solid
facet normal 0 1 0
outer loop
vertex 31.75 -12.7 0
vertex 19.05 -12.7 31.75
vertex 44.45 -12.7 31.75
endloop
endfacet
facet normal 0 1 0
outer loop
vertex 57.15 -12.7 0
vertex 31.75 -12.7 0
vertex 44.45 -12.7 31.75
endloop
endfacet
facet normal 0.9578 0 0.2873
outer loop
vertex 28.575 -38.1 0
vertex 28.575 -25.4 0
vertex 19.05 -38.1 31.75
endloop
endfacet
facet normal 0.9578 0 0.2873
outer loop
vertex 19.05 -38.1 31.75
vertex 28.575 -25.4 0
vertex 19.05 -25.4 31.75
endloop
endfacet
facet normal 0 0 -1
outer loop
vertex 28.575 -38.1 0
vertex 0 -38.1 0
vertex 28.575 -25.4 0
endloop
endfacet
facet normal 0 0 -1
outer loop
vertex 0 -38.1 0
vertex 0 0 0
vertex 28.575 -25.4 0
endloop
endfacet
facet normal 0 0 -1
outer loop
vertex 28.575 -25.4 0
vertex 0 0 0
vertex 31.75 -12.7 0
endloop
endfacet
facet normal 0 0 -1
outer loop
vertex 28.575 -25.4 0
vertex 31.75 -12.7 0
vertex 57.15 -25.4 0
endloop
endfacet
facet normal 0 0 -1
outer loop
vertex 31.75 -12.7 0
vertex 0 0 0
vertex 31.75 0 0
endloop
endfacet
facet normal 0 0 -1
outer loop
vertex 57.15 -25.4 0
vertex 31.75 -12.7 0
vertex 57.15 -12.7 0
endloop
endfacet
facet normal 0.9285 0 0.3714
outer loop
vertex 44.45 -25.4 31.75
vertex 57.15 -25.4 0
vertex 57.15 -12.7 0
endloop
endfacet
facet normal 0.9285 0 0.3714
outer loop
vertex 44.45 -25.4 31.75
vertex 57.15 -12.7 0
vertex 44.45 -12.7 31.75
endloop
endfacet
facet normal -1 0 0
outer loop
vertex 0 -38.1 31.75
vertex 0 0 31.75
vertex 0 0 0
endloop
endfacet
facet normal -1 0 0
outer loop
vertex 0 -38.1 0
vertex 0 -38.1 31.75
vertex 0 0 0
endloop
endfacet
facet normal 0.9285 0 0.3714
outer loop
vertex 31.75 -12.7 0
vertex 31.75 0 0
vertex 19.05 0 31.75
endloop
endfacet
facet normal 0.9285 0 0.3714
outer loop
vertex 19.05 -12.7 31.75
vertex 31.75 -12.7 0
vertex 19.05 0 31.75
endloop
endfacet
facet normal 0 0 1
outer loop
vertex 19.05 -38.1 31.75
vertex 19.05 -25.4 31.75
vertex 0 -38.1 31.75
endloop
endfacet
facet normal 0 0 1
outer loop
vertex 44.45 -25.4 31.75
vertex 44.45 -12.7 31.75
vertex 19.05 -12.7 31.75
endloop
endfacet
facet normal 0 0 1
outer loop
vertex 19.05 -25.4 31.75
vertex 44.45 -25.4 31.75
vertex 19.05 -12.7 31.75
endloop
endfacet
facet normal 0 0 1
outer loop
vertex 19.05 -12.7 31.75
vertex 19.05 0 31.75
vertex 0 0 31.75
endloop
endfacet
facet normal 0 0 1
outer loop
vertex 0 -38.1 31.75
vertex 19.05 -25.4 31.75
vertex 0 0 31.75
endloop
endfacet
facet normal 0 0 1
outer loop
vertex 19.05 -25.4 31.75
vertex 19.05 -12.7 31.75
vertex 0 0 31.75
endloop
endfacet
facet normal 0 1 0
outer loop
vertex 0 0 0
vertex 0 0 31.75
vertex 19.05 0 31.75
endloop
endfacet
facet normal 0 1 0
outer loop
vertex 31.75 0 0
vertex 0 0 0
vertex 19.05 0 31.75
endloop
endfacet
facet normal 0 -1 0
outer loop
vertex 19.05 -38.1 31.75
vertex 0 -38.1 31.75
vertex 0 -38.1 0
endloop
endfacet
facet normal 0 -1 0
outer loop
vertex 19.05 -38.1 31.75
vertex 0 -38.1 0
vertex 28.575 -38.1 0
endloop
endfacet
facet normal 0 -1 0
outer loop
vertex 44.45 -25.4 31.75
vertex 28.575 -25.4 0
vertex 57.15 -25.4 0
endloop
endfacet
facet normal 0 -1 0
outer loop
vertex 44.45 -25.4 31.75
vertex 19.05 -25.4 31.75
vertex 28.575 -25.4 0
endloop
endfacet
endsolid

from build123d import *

# Parameters (mm, degrees)
F1_DEPTH = 25.4
F3_DEPTH = 12.7
F5_DEPTH = 12.7


with BuildPart() as f1:
    # F0 (on Front) → F1 (new body)
    with BuildSketch(Plane.XZ):
        Polygon((0, 31.75), (0, 0), (31.75, 0), (19.05, 31.75), align=None)
    extrude(amount=F1_DEPTH)

    # F2 (on face) → F3 (join)
    with BuildSketch(Plane.XZ.offset(25.4)):
        Polygon((19.05, 31.75), (31.75, 0), (57.15, 0), (44.45, 31.75), align=None)
    extrude(amount=-F3_DEPTH)

    # F4 (on face) → F5 (join)
    with BuildSketch(Plane.XZ.offset(25.4)):
        Polygon((0, 31.75), (0, 0), (28.575, 0), (19.05, 31.75), align=None)
    extrude(amount=F5_DEPTH)


solid = f1.part
